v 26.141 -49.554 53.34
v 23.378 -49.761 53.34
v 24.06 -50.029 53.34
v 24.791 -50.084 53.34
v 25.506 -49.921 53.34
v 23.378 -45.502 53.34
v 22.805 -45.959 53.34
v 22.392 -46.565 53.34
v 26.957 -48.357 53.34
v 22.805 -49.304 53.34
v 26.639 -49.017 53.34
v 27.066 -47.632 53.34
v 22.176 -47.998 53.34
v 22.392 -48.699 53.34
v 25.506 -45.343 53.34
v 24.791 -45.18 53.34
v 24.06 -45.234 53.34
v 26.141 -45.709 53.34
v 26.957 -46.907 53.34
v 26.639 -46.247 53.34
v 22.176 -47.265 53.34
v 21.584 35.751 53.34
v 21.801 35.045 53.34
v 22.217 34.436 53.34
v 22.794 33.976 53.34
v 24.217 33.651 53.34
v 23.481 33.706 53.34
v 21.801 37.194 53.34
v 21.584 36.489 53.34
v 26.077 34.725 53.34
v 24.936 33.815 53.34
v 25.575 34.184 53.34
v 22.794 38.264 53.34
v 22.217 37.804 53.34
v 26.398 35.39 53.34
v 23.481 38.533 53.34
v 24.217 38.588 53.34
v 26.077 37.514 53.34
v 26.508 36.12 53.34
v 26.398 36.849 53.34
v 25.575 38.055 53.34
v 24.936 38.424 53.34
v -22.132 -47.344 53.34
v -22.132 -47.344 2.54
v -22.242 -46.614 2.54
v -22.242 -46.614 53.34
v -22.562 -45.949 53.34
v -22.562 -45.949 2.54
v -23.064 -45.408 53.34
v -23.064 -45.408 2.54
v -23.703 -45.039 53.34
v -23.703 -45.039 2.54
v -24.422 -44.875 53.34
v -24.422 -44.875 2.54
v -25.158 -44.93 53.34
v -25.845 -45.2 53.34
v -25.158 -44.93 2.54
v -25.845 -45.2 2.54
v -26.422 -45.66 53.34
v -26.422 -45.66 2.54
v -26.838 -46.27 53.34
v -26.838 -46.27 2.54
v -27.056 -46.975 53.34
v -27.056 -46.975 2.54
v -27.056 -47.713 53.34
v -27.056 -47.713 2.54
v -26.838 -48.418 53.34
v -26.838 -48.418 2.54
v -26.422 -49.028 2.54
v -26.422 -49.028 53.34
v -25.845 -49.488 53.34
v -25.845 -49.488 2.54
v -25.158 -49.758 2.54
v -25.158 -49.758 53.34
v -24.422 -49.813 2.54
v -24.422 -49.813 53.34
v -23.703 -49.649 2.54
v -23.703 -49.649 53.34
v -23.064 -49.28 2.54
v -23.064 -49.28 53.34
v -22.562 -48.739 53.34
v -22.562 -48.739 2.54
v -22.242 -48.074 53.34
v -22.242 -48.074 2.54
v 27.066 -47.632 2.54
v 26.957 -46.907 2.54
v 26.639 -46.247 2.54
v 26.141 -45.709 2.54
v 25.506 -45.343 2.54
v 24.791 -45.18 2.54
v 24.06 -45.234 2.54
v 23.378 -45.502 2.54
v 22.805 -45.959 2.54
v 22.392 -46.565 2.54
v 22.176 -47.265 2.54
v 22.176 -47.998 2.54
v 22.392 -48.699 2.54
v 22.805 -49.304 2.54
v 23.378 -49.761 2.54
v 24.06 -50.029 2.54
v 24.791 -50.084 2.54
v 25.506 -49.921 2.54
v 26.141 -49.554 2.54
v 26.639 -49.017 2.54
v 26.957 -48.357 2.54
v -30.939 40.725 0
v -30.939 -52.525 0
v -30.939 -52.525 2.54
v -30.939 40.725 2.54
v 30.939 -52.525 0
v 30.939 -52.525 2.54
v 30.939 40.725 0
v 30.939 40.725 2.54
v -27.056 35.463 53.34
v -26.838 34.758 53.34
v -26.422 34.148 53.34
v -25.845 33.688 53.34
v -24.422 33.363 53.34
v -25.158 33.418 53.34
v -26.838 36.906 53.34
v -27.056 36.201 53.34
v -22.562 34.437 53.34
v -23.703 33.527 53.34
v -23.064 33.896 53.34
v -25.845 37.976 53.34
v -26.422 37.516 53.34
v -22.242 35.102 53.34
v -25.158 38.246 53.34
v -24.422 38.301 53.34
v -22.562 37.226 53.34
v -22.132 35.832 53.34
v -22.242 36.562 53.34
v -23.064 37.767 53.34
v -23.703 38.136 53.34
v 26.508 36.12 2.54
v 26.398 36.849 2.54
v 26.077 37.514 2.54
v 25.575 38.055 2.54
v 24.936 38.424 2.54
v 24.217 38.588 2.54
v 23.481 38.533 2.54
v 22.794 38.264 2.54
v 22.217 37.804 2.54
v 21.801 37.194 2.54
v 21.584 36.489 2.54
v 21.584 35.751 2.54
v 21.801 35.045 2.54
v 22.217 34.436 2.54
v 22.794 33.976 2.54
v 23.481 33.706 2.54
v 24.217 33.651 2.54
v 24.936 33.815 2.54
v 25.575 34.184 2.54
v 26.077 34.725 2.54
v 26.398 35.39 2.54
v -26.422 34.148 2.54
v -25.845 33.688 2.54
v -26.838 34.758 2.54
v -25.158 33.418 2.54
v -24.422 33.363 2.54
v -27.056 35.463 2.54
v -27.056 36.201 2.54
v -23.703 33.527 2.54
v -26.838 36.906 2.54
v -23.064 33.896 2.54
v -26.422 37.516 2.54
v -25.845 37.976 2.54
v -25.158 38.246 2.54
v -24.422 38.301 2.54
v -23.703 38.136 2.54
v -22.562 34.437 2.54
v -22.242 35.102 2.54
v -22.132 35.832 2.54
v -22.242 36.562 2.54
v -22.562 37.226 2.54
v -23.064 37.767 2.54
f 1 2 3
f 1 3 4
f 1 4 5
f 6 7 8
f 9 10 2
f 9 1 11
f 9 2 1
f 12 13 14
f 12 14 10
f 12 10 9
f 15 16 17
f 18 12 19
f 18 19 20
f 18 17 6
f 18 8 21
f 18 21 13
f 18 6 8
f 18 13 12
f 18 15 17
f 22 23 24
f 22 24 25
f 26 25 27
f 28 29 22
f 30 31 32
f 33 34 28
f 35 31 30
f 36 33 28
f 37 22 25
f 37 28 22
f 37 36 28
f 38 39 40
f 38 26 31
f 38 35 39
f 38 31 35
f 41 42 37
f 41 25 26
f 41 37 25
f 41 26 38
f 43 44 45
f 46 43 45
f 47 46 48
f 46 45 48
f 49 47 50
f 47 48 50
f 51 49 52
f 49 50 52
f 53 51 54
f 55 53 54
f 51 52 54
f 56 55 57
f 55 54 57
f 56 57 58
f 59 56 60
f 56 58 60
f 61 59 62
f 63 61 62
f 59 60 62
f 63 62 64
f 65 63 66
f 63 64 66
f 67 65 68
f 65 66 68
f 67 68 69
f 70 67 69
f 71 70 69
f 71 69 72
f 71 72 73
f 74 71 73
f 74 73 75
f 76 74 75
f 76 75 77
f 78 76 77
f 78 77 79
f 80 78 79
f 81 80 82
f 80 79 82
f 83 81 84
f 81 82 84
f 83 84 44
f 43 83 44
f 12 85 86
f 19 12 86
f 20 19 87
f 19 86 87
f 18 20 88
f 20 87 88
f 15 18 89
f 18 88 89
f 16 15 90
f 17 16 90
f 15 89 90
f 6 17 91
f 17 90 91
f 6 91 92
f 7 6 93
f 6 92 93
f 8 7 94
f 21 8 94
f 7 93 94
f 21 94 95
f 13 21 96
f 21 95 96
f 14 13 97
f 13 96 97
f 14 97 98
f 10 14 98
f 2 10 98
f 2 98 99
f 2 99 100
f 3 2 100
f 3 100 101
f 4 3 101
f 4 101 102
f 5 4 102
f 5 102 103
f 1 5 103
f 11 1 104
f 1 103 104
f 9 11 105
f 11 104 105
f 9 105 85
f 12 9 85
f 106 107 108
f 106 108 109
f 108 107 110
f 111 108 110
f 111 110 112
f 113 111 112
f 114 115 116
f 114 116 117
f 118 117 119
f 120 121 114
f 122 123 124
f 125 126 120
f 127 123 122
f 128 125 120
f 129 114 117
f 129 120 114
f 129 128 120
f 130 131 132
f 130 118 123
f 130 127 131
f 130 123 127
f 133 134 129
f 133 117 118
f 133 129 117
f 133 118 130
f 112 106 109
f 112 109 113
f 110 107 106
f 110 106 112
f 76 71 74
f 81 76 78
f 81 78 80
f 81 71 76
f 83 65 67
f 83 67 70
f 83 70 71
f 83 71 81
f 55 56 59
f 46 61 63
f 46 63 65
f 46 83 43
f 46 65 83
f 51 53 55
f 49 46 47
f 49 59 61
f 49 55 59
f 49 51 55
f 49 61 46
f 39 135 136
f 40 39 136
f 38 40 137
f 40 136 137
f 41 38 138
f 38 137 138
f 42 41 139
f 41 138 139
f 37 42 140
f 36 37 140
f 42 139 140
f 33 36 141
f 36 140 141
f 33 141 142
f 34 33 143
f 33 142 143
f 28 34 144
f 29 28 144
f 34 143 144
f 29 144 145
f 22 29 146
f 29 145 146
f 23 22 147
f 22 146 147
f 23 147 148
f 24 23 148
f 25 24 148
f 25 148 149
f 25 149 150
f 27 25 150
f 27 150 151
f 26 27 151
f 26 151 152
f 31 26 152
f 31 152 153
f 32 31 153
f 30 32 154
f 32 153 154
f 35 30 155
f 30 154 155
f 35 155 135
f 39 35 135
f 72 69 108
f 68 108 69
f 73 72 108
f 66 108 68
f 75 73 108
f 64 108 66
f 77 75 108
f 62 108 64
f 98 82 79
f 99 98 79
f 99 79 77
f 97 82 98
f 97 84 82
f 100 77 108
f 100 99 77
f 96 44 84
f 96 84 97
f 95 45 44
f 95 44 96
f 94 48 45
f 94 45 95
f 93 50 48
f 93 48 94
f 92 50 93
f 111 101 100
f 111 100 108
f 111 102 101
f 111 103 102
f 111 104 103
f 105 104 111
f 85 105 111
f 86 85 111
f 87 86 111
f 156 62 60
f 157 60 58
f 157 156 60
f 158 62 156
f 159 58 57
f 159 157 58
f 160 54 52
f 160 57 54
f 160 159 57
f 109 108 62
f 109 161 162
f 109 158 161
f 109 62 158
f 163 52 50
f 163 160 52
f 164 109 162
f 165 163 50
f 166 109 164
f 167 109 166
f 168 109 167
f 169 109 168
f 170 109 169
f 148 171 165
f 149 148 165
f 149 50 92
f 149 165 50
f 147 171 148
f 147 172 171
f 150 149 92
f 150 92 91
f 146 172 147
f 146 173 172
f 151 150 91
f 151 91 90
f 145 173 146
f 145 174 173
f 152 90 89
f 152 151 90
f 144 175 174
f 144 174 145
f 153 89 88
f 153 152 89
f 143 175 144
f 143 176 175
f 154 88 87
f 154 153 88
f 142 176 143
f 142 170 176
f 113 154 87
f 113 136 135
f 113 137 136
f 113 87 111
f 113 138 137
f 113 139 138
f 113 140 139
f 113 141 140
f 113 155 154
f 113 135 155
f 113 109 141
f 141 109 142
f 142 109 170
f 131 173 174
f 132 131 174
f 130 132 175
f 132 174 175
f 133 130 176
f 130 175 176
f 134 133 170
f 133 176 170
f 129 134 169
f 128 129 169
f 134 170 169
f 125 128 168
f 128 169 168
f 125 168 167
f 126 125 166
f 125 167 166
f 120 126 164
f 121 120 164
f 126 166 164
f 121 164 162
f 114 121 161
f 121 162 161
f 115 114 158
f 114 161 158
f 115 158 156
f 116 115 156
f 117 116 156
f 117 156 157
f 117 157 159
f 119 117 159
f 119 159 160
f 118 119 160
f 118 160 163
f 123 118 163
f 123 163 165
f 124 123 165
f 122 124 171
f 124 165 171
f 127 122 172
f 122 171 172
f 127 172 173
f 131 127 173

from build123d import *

# Parameters (mm, degrees)
F0_W      = 61.878236
F0_H      = 93.249064
F1_DEPTH  = 2.54
F2_R      = 3.356363
F3_DEPTH  = 34.29
F4_R      = 2.475799
F5_DEPTH  = 50.8
F6_R      = 2.475799
F7_DEPTH  = 50.8
F8_R      = 2.475798
F9_DEPTH  = 50.8
F10_R     = 2.459012
F11_DEPTH = 50.8


with BuildPart() as f1:
    # F0 (on Top) → F1 (new body)
    with BuildSketch(Plane.XY):
        with Locations((-1e-06, -5.90002)):
            Rectangle(F0_W, F0_H)
    extrude(amount=F1_DEPTH)

    # F2 (on face) → F3 (cut)
    with BuildSketch(Plane(origin=(0, 0, 0), x_dir=(1, 0, 0), z_dir=(0, 0, -1))):
        with Locations((-24.319587, 47.631852)):
            Circle(F2_R)
    extrude(amount=F3_DEPTH, mode=Mode.SUBTRACT)

    # F4 (on face) → F5 (join)
    with BuildSketch(Plane.XY.offset(2.54)):
        with Locations((-24.607392, 35.831816)):
            Circle(F4_R)
    extrude(amount=F5_DEPTH)

    # F6 (on face) → F7 (join)
    with BuildSketch(Plane.XY.offset(2.54)):
        with Locations((24.031781, 36.119621)):
            Circle(F6_R)
    extrude(amount=F7_DEPTH)

    # F8 (on face) → F9 (join)
    with BuildSketch(Plane.XY.offset(2.54)):
        with Locations((-24.607392, -47.344048)):
            Circle(F8_R)
    extrude(amount=F9_DEPTH)

    # F10 (on face) → F11 (join)
    with BuildSketch(Plane.XY.offset(2.54)):
        with Locations((24.607392, -47.631852)):
            Circle(F10_R)
    extrude(amount=F11_DEPTH)


solid = f1.part
